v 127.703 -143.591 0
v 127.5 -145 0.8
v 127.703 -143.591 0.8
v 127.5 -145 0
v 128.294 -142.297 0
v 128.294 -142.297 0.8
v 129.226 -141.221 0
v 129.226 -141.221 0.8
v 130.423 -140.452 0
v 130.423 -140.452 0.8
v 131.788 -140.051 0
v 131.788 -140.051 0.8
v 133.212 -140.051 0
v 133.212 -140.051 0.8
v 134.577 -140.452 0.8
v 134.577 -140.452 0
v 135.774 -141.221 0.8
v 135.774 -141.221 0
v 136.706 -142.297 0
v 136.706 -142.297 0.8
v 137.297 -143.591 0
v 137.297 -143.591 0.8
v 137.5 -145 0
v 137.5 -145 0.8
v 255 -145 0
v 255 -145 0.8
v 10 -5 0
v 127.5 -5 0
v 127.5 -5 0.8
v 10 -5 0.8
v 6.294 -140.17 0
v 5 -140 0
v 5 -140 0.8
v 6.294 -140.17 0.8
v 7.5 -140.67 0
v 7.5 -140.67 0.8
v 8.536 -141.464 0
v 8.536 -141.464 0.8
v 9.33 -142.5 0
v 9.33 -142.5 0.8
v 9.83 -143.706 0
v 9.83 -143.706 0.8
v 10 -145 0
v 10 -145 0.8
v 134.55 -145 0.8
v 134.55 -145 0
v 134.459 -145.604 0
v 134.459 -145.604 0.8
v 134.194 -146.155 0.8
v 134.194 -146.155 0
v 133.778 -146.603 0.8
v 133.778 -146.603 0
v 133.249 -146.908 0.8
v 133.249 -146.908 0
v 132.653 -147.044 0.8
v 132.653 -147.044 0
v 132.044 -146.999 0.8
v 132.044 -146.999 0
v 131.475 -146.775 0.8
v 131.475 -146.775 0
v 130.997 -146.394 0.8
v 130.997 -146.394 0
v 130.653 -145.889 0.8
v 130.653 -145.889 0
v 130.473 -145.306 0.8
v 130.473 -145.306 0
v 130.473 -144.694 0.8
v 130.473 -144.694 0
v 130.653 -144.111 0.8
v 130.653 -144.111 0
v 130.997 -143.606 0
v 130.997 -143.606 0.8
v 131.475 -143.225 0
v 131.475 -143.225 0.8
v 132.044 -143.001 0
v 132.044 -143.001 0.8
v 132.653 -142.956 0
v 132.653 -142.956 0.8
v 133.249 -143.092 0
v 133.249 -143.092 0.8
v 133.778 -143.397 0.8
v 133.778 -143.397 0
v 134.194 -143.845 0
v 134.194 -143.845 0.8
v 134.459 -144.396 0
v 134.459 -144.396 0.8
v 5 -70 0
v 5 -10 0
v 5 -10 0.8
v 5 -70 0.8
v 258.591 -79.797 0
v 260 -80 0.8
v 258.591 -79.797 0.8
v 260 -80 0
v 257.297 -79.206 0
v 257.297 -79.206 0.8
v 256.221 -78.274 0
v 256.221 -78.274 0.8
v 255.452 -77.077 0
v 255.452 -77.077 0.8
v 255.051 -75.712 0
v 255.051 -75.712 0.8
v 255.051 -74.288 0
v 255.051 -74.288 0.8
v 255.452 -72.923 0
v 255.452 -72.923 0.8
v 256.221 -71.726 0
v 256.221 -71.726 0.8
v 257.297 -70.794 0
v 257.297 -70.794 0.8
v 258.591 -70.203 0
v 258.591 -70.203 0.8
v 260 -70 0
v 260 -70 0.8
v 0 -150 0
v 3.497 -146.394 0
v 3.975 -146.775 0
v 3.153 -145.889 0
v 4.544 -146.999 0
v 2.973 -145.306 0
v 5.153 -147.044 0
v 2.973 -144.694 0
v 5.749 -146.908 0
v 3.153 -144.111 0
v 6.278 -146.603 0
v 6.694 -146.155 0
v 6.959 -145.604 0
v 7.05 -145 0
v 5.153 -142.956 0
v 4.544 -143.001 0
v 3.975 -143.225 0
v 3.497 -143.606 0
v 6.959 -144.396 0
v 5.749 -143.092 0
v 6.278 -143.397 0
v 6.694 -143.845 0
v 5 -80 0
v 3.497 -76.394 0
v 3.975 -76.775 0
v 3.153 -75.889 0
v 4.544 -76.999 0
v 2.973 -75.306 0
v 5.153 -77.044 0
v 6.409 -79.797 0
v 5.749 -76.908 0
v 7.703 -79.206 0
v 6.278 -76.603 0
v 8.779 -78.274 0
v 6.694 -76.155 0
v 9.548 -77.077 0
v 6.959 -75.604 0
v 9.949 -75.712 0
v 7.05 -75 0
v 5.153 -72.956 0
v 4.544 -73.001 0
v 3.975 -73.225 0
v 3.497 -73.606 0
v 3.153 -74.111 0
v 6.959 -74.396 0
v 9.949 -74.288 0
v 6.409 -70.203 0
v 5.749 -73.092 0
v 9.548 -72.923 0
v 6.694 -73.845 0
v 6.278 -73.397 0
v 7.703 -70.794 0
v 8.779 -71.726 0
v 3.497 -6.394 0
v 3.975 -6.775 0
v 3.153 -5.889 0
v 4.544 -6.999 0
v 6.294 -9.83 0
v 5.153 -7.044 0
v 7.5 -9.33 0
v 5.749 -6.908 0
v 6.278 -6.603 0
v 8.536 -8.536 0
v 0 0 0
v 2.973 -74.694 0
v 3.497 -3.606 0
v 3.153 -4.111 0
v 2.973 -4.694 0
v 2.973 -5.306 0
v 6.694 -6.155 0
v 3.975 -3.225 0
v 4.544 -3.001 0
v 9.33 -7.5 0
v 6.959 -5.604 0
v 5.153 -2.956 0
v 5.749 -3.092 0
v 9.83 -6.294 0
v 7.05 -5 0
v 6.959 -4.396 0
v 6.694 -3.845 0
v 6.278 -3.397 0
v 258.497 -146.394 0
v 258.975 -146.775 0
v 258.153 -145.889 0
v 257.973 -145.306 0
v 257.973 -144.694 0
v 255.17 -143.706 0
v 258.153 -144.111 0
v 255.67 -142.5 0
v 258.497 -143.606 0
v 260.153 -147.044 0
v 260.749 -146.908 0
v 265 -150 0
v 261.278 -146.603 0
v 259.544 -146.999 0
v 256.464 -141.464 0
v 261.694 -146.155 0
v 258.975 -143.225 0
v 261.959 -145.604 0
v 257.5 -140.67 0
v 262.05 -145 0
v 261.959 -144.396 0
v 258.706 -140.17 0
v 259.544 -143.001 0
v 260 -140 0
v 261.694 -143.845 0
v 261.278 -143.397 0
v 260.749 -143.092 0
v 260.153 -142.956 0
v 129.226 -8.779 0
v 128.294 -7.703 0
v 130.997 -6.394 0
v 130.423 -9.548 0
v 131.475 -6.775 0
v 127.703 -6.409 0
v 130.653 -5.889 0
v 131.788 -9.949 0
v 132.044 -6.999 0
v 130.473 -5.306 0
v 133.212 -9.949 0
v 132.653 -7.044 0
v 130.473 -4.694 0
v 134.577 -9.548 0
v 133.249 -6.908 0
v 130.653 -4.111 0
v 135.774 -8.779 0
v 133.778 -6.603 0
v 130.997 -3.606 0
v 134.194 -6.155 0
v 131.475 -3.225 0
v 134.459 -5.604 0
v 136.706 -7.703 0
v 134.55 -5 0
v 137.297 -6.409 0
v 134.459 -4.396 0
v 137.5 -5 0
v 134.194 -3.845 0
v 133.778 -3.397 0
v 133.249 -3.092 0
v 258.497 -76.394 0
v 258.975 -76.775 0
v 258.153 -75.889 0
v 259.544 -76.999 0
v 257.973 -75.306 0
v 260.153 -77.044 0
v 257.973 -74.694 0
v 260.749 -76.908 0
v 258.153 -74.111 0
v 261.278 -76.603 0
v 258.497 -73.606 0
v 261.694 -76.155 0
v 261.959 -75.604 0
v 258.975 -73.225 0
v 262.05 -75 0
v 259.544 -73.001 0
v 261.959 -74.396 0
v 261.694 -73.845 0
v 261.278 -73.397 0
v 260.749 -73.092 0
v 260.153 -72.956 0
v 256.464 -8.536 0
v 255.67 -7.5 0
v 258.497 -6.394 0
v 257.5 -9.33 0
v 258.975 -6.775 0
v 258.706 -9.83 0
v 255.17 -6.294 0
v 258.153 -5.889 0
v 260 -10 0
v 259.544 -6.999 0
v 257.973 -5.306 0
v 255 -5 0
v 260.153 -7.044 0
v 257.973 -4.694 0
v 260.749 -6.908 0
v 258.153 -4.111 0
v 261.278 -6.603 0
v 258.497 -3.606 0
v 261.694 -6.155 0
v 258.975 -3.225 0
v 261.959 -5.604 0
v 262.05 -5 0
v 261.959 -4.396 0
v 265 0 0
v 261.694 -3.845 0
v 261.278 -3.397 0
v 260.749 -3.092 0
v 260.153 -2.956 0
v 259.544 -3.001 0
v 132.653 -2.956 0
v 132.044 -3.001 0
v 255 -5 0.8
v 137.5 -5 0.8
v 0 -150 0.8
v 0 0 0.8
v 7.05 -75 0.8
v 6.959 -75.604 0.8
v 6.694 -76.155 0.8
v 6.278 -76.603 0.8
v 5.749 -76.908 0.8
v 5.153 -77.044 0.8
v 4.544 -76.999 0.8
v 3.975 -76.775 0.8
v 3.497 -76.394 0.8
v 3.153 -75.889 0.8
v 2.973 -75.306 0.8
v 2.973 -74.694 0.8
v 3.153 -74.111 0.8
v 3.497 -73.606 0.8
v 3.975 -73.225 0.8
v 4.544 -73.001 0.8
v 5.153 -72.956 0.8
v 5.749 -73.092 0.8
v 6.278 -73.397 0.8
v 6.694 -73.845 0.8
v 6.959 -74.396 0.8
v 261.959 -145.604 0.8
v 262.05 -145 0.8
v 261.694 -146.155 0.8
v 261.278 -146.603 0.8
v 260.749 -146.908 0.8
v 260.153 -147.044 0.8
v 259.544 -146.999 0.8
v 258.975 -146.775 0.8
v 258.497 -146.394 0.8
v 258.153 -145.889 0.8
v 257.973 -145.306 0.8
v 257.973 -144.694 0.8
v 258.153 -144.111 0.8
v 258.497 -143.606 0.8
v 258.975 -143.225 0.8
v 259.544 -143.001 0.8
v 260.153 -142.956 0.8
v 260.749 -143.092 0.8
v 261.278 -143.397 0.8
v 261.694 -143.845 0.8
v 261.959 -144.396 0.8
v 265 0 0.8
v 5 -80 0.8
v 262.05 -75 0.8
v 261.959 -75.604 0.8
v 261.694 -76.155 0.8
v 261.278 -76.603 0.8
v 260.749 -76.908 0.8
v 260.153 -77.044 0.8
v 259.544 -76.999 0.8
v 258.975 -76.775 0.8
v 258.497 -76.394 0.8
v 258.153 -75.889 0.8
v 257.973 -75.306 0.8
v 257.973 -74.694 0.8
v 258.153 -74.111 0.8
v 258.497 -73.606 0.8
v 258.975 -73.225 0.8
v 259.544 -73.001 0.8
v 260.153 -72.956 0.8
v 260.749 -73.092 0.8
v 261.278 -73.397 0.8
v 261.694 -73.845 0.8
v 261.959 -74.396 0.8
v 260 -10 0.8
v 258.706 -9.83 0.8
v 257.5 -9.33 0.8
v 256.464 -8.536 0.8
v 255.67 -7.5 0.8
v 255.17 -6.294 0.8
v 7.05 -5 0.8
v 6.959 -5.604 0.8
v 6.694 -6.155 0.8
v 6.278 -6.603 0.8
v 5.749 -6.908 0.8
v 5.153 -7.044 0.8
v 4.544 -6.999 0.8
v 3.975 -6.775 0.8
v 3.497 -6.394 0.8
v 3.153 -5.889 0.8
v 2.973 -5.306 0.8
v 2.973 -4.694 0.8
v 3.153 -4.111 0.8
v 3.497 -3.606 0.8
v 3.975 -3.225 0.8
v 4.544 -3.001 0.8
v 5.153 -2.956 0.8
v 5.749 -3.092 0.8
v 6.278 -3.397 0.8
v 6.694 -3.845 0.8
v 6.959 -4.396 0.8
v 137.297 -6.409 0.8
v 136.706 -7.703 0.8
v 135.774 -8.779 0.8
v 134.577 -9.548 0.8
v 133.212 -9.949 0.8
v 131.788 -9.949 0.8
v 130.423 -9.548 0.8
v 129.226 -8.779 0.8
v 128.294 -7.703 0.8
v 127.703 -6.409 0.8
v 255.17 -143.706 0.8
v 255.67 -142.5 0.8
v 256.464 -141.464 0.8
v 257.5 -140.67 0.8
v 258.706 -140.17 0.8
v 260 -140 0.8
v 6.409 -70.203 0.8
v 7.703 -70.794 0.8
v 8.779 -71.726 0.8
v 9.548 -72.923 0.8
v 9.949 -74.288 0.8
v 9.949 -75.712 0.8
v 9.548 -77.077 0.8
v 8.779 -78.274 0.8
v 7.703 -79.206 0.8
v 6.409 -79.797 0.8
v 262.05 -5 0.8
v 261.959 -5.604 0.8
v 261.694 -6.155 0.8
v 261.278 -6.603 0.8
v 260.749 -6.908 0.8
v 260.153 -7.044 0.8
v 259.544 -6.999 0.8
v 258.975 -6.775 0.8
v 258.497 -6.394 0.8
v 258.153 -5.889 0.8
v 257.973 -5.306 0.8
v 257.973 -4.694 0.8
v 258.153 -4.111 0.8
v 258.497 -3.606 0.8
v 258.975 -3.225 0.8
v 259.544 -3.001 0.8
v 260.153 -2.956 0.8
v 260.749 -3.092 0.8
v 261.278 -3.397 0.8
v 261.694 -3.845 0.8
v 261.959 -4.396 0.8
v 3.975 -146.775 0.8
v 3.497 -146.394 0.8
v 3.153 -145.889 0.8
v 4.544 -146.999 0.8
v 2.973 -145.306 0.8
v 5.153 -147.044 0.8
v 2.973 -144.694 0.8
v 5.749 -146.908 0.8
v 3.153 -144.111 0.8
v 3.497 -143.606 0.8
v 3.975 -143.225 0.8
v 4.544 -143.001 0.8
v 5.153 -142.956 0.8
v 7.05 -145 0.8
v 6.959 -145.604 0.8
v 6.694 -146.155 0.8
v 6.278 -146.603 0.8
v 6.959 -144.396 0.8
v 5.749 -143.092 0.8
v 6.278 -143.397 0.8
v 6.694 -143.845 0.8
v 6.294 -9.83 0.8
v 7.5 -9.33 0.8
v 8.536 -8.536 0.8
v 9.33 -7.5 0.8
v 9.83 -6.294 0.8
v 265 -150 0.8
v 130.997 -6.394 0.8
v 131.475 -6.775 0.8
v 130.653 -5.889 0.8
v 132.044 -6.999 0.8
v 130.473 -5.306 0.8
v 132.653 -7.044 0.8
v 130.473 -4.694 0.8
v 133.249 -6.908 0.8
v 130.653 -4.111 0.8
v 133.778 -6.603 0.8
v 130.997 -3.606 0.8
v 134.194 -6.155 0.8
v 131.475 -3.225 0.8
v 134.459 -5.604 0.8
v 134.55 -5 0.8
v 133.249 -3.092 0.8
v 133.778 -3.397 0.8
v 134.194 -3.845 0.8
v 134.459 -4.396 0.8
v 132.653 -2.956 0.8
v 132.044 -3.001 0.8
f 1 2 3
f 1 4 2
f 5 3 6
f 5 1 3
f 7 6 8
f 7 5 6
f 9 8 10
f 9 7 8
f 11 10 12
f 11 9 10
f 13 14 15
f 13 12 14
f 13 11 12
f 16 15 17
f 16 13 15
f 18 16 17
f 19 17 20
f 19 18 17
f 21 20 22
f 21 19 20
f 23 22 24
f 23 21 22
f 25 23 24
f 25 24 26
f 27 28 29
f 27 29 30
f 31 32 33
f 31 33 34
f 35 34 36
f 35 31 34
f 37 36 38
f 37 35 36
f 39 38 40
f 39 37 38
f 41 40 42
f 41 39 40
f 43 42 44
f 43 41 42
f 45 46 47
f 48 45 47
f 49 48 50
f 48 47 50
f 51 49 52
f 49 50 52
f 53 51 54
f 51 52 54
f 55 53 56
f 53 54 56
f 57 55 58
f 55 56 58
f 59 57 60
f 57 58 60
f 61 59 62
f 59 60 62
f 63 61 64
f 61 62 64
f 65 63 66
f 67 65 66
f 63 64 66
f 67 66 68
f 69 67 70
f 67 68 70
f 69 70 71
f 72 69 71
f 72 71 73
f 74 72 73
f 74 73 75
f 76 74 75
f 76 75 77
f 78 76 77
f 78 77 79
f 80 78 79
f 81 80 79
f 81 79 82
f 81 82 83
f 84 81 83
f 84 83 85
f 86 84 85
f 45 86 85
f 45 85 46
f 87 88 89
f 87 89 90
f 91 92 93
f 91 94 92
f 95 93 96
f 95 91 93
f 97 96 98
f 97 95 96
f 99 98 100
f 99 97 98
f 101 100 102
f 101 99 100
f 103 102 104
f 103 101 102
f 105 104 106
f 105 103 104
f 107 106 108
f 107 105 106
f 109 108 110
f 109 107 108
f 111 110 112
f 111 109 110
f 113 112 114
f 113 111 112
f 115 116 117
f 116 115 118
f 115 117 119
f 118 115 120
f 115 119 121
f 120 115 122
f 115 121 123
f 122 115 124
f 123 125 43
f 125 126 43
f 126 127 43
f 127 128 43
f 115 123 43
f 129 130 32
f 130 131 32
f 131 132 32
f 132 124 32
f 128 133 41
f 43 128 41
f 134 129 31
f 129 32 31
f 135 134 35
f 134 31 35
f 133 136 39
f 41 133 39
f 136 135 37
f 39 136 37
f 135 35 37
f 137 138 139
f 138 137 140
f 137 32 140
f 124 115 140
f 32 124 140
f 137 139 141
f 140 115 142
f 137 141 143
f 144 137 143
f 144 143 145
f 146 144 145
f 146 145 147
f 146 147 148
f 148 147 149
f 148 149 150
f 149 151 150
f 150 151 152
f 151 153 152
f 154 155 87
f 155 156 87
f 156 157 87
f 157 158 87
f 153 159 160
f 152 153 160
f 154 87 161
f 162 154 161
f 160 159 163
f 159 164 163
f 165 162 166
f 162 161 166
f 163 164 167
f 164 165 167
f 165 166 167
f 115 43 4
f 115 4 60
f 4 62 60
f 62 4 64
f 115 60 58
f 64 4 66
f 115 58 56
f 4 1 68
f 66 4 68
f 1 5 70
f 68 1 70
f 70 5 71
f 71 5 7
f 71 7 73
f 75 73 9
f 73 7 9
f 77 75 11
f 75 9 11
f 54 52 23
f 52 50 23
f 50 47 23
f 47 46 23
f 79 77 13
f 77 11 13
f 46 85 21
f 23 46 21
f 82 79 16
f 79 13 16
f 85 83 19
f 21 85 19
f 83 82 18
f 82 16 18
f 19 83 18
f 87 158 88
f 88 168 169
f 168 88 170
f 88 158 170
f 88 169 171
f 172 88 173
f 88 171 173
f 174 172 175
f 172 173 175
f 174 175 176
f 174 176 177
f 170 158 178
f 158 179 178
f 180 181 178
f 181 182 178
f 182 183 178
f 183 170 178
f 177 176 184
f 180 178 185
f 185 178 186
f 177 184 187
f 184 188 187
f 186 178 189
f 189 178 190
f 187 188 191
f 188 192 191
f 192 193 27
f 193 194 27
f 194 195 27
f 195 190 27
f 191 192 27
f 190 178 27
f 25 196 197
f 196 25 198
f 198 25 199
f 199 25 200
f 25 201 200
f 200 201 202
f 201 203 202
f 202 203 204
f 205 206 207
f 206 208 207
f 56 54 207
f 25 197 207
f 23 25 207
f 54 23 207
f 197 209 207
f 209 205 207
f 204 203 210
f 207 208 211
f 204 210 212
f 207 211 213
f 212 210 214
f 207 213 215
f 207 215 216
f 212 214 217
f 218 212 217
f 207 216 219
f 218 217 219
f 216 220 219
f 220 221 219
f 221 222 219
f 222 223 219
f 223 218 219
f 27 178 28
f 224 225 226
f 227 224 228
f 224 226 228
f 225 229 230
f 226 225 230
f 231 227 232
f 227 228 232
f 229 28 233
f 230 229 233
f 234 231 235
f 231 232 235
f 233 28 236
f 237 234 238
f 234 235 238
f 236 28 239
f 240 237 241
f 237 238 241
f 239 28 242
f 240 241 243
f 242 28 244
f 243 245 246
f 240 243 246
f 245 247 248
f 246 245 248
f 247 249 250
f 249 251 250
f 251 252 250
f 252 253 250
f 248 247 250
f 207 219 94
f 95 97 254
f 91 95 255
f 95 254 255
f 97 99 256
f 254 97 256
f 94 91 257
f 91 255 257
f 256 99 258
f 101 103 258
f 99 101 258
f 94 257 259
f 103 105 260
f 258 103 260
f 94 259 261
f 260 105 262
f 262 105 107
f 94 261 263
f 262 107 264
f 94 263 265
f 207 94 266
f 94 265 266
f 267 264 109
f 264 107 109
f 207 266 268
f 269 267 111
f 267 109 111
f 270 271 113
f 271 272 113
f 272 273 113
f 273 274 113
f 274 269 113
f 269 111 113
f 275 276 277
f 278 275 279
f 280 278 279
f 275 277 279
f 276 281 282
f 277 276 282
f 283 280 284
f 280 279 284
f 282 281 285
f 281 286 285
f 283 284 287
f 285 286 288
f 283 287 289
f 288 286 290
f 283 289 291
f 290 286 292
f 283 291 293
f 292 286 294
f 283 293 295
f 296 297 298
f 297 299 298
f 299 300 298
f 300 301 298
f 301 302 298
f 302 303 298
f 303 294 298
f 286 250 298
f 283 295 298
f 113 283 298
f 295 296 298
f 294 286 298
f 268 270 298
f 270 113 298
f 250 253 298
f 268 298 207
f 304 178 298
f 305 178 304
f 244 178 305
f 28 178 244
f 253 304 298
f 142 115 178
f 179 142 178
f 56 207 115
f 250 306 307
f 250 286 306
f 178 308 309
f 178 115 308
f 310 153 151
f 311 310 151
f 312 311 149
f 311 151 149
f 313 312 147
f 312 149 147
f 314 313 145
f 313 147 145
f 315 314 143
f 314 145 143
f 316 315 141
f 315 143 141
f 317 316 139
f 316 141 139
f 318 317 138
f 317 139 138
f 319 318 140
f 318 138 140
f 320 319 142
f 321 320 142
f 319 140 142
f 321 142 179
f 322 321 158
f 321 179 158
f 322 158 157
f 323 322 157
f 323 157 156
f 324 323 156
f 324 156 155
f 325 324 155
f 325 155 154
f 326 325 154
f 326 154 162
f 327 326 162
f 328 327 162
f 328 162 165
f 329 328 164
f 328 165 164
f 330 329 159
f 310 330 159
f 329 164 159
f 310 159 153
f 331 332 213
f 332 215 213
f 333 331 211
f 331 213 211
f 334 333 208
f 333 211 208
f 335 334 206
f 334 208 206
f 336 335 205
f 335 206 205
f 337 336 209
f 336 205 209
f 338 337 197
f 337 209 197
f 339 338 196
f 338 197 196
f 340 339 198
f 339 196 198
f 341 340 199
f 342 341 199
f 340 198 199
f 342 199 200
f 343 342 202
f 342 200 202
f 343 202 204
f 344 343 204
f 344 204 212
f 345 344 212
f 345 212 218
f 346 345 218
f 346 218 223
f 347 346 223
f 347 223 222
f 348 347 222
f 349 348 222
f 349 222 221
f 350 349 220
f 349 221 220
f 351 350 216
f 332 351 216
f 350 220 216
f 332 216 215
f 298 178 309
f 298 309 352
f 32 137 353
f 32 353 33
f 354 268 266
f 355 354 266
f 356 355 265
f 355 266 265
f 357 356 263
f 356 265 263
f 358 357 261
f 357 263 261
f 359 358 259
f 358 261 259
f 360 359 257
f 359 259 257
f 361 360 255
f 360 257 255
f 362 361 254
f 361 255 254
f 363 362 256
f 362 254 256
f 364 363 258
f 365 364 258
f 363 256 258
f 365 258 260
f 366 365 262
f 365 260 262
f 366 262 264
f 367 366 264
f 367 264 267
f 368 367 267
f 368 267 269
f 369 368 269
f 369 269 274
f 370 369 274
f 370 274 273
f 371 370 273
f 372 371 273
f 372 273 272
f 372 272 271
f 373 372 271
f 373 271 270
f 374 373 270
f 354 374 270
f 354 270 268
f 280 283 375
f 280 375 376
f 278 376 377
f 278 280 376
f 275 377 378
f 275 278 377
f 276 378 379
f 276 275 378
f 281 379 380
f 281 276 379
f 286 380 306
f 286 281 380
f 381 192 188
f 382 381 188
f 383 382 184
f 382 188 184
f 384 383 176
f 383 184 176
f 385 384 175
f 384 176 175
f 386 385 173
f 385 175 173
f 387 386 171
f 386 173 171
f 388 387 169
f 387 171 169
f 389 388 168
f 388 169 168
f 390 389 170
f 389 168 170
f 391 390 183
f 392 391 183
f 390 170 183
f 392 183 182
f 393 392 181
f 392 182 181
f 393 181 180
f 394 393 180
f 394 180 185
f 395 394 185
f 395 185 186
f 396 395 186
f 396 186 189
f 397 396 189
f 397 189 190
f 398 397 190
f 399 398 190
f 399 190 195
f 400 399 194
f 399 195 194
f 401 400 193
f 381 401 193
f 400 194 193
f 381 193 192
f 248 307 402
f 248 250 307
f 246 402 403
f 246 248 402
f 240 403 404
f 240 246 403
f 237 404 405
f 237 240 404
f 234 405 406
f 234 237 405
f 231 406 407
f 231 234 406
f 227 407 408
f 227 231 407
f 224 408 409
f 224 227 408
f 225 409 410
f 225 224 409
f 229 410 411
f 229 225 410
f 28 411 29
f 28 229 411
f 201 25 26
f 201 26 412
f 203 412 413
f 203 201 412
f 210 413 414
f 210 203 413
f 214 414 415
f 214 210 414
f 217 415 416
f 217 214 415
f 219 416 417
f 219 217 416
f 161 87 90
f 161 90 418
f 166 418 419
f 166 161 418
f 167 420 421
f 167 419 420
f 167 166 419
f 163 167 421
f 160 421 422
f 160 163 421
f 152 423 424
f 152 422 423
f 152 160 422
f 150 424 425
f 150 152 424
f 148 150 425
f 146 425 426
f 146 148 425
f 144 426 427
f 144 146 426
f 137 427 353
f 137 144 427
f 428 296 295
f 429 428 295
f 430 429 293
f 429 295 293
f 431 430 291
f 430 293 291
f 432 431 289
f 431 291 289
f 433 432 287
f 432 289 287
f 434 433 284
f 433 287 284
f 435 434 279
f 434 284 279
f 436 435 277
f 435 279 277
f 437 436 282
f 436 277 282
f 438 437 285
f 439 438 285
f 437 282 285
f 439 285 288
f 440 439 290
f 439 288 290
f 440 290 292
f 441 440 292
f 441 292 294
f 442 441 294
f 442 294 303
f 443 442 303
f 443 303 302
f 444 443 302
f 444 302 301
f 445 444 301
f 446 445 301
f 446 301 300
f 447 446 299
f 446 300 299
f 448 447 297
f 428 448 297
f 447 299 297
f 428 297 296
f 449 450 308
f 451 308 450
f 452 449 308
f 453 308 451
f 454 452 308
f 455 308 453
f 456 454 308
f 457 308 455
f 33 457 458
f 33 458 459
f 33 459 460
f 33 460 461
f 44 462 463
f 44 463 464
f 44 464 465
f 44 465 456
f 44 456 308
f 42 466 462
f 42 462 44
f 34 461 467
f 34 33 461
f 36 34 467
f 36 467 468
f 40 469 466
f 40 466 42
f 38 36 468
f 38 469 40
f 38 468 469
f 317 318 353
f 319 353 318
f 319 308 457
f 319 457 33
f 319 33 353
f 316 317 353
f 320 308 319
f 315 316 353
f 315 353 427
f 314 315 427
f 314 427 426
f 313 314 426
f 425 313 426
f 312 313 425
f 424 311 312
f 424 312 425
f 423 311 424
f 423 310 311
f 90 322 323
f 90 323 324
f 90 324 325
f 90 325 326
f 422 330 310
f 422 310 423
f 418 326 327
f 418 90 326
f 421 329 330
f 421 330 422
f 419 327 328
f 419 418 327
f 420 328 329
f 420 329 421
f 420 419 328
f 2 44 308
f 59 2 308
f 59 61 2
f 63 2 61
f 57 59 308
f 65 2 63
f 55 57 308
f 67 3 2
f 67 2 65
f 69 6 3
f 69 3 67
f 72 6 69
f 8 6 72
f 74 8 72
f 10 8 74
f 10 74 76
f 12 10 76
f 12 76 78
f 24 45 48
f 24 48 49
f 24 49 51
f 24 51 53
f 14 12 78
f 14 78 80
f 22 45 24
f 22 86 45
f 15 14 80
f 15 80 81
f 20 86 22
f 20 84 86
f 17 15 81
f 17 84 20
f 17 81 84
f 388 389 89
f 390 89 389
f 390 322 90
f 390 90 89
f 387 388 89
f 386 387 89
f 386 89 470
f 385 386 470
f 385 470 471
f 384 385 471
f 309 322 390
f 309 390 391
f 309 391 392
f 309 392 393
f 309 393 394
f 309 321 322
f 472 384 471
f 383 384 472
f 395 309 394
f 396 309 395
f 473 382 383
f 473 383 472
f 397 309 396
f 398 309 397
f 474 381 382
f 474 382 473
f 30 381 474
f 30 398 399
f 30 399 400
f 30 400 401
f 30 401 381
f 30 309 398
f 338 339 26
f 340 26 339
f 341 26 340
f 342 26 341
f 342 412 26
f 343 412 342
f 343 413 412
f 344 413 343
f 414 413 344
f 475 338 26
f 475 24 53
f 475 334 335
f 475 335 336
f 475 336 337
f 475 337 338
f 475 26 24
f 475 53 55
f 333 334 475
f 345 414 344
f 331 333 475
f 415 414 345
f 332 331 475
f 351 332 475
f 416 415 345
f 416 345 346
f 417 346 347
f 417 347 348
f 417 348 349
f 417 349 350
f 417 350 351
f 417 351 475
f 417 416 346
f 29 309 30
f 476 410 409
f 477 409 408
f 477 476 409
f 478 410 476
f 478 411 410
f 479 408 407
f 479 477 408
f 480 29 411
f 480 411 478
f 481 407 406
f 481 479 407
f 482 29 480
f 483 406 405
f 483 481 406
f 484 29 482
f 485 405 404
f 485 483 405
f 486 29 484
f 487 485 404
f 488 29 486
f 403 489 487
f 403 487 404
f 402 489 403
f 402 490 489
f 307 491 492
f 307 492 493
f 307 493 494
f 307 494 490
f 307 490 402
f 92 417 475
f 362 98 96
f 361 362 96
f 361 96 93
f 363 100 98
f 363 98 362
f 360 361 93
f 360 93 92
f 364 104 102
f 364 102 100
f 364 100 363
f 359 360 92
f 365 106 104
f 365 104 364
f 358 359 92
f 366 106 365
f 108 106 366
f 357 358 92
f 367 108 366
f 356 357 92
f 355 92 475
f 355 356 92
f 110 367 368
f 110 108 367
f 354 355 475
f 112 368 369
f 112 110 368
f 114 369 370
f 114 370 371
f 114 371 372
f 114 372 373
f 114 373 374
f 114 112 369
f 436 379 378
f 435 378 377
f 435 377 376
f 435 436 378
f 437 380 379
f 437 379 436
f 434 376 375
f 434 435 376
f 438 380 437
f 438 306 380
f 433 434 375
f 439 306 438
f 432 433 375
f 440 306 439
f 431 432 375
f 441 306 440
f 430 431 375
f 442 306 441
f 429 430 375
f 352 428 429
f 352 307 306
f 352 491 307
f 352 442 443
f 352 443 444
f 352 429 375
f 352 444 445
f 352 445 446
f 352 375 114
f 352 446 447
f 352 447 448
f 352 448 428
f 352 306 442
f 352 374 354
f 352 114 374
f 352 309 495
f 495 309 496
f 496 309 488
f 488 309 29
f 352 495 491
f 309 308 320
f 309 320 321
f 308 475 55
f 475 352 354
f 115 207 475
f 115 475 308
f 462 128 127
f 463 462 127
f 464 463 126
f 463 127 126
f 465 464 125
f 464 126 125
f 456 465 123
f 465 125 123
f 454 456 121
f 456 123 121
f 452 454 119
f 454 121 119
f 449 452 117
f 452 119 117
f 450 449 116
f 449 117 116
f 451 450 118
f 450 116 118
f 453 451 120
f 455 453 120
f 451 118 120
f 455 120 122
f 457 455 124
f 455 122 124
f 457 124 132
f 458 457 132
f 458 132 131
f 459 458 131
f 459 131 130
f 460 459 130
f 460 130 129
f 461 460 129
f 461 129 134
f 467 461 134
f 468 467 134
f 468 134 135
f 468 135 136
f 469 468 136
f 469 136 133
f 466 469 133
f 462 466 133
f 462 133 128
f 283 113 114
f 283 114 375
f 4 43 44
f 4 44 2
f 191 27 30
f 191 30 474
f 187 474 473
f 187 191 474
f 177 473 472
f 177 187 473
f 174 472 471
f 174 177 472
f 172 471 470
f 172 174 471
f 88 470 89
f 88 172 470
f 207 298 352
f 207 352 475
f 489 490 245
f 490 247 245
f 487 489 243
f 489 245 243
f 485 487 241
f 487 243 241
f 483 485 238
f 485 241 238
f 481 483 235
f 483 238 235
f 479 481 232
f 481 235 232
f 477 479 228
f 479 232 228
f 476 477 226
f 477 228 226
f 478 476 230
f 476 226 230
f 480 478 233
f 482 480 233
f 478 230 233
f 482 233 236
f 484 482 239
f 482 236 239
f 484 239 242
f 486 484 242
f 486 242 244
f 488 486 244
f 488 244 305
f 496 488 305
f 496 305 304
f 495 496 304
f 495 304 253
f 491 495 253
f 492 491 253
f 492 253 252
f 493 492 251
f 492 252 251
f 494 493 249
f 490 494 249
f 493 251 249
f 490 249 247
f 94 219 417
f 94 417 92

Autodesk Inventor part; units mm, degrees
ref_plane "YZ Plane" through (0, 0, 0) normal (1, 0, 0) x (0, 1, 0)
ref_plane "XZ Plane" through (0, 0, 0) normal (0, 1, 0) x (-1, 0, 0)
ref_plane "XY Plane" through (0, 0, 0) normal (0, 0, 1) x (1, 0, 0)
sketch "Sketch1" plane through (0, 0, 0) normal (0, 0, 1) x (1, 0, 0)
  line L0 (0, 0) -> (265, 0)
  line L1 (265, 0) -> (265, -150)
  line L2 (265, -150) -> (0, -150)
  line L3 (0, -150) -> (0, 0)
  line L4 (260, -5) -> (5, -5)
  line L5 (5, -5) -> (5, -145)
  line L6 (5, -145) -> (260, -145)
  line L7 (260, -145) -> (260, -5)
  circle A0 centre (5, -5) radius 5
  circle A1 centre (260, -5) radius 5
  circle A2 centre (260, -145) radius 5
  circle A3 centre (5, -145) radius 5
  line L8 (5, -5) -> (5, -75)
  circle A4 centre (5, -75) radius 5
  line L9 (260, -5) -> (260, -75)
  circle A5 centre (260, -75) radius 5
  line L10 (5, -5) -> (132.5, -5)
  circle A6 centre (132.5, -5) radius 5
  line L11 (5, -145) -> (132.5, -145)
  circle A7 centre (132.5, -145) radius 5
  circle A8 centre (5, -5) radius 2.05
  circle A9 centre (5, -75) radius 2.05
  circle A10 centre (5, -145) radius 2.05
  circle A11 centre (132.5, -145) radius 2.05
  circle A12 centre (260, -145) radius 2.05
  circle A13 centre (260, -75) radius 2.05
  circle A14 centre (260, -5) radius 2.05
  circle A15 centre (132.5, -5) radius 2.05
  point P0 (5, -140)
  point P1 (5, -80)
  point P2 (5, -70)
  point P3 (5, -10)
  point P4 (10, -5)
  point P5 (127.5, -5)
  point P6 (137.5, -5)
  point P7 (255, -5)
  point P8 (260, -10)
  point P9 (260, -70)
  point P10 (260, -80)
  point P11 (260, -140)
  point P12 (255, -145)
  point P13 (137.5, -145)
  point P14 (127.5, -145)
  point P15 (10, -145)
  dimension "d0" = 265
  dimension "d1" = 150
  dimension "d2" = 5
  dimension "d3" = 10
  dimension "d4" = 10
  dimension "d5" = 10
  dimension "d6" = 10
  dimension "d7" = 70
  dimension "d8" = 10
  dimension "d9" = 70
  dimension "d10" = 10
  dimension "d11" = 127.5
  dimension "d12" = 10
  dimension "d13" = 127.5
  dimension "d14" = 10
  dimension "d15" = 4.1
  dimension "d16" = 4.1
  dimension "d17" = 4.1
  dimension "d18" = 4.1
  dimension "d19" = 4.1
  dimension "d20" = 4.1
  dimension "d21" = 4.1
  dimension "d22" = 4.1
extrude "Extrusion1" add sketch "Sketch1" along normal blind 0.8 contours L0 A0 L3 | L0 A6 L4 A0 | A0 L4 A8 L5 | A0 L5 A4 L3 | L0 A1 L4 A6 | A6 L4 A15 | A0 L5 A8 L4 | A4 L5 A3 L3 | A4 L5 A9 | L0 L1 A1 | A1 L7 A14 L4 | A6 L4 A15 | A3 L2 L3 | A3 L5 A10 L6 | A4 L5 A9 | L1 A5 L7 A1 | L4 A14 L7 A1 | A3 L6 A10 L5 | A3 L6 A7 L2 | A5 L7 A13 | L1 A2 L7 A5 | A7 L6 A2 L2 | A7 L6 A11 | A2 L6 A12 L7 | L1 L2 A2 | L7 A13 A5 | A7 L6 A11 | L7 A12 L6 A2
properties part number "Empaque"
